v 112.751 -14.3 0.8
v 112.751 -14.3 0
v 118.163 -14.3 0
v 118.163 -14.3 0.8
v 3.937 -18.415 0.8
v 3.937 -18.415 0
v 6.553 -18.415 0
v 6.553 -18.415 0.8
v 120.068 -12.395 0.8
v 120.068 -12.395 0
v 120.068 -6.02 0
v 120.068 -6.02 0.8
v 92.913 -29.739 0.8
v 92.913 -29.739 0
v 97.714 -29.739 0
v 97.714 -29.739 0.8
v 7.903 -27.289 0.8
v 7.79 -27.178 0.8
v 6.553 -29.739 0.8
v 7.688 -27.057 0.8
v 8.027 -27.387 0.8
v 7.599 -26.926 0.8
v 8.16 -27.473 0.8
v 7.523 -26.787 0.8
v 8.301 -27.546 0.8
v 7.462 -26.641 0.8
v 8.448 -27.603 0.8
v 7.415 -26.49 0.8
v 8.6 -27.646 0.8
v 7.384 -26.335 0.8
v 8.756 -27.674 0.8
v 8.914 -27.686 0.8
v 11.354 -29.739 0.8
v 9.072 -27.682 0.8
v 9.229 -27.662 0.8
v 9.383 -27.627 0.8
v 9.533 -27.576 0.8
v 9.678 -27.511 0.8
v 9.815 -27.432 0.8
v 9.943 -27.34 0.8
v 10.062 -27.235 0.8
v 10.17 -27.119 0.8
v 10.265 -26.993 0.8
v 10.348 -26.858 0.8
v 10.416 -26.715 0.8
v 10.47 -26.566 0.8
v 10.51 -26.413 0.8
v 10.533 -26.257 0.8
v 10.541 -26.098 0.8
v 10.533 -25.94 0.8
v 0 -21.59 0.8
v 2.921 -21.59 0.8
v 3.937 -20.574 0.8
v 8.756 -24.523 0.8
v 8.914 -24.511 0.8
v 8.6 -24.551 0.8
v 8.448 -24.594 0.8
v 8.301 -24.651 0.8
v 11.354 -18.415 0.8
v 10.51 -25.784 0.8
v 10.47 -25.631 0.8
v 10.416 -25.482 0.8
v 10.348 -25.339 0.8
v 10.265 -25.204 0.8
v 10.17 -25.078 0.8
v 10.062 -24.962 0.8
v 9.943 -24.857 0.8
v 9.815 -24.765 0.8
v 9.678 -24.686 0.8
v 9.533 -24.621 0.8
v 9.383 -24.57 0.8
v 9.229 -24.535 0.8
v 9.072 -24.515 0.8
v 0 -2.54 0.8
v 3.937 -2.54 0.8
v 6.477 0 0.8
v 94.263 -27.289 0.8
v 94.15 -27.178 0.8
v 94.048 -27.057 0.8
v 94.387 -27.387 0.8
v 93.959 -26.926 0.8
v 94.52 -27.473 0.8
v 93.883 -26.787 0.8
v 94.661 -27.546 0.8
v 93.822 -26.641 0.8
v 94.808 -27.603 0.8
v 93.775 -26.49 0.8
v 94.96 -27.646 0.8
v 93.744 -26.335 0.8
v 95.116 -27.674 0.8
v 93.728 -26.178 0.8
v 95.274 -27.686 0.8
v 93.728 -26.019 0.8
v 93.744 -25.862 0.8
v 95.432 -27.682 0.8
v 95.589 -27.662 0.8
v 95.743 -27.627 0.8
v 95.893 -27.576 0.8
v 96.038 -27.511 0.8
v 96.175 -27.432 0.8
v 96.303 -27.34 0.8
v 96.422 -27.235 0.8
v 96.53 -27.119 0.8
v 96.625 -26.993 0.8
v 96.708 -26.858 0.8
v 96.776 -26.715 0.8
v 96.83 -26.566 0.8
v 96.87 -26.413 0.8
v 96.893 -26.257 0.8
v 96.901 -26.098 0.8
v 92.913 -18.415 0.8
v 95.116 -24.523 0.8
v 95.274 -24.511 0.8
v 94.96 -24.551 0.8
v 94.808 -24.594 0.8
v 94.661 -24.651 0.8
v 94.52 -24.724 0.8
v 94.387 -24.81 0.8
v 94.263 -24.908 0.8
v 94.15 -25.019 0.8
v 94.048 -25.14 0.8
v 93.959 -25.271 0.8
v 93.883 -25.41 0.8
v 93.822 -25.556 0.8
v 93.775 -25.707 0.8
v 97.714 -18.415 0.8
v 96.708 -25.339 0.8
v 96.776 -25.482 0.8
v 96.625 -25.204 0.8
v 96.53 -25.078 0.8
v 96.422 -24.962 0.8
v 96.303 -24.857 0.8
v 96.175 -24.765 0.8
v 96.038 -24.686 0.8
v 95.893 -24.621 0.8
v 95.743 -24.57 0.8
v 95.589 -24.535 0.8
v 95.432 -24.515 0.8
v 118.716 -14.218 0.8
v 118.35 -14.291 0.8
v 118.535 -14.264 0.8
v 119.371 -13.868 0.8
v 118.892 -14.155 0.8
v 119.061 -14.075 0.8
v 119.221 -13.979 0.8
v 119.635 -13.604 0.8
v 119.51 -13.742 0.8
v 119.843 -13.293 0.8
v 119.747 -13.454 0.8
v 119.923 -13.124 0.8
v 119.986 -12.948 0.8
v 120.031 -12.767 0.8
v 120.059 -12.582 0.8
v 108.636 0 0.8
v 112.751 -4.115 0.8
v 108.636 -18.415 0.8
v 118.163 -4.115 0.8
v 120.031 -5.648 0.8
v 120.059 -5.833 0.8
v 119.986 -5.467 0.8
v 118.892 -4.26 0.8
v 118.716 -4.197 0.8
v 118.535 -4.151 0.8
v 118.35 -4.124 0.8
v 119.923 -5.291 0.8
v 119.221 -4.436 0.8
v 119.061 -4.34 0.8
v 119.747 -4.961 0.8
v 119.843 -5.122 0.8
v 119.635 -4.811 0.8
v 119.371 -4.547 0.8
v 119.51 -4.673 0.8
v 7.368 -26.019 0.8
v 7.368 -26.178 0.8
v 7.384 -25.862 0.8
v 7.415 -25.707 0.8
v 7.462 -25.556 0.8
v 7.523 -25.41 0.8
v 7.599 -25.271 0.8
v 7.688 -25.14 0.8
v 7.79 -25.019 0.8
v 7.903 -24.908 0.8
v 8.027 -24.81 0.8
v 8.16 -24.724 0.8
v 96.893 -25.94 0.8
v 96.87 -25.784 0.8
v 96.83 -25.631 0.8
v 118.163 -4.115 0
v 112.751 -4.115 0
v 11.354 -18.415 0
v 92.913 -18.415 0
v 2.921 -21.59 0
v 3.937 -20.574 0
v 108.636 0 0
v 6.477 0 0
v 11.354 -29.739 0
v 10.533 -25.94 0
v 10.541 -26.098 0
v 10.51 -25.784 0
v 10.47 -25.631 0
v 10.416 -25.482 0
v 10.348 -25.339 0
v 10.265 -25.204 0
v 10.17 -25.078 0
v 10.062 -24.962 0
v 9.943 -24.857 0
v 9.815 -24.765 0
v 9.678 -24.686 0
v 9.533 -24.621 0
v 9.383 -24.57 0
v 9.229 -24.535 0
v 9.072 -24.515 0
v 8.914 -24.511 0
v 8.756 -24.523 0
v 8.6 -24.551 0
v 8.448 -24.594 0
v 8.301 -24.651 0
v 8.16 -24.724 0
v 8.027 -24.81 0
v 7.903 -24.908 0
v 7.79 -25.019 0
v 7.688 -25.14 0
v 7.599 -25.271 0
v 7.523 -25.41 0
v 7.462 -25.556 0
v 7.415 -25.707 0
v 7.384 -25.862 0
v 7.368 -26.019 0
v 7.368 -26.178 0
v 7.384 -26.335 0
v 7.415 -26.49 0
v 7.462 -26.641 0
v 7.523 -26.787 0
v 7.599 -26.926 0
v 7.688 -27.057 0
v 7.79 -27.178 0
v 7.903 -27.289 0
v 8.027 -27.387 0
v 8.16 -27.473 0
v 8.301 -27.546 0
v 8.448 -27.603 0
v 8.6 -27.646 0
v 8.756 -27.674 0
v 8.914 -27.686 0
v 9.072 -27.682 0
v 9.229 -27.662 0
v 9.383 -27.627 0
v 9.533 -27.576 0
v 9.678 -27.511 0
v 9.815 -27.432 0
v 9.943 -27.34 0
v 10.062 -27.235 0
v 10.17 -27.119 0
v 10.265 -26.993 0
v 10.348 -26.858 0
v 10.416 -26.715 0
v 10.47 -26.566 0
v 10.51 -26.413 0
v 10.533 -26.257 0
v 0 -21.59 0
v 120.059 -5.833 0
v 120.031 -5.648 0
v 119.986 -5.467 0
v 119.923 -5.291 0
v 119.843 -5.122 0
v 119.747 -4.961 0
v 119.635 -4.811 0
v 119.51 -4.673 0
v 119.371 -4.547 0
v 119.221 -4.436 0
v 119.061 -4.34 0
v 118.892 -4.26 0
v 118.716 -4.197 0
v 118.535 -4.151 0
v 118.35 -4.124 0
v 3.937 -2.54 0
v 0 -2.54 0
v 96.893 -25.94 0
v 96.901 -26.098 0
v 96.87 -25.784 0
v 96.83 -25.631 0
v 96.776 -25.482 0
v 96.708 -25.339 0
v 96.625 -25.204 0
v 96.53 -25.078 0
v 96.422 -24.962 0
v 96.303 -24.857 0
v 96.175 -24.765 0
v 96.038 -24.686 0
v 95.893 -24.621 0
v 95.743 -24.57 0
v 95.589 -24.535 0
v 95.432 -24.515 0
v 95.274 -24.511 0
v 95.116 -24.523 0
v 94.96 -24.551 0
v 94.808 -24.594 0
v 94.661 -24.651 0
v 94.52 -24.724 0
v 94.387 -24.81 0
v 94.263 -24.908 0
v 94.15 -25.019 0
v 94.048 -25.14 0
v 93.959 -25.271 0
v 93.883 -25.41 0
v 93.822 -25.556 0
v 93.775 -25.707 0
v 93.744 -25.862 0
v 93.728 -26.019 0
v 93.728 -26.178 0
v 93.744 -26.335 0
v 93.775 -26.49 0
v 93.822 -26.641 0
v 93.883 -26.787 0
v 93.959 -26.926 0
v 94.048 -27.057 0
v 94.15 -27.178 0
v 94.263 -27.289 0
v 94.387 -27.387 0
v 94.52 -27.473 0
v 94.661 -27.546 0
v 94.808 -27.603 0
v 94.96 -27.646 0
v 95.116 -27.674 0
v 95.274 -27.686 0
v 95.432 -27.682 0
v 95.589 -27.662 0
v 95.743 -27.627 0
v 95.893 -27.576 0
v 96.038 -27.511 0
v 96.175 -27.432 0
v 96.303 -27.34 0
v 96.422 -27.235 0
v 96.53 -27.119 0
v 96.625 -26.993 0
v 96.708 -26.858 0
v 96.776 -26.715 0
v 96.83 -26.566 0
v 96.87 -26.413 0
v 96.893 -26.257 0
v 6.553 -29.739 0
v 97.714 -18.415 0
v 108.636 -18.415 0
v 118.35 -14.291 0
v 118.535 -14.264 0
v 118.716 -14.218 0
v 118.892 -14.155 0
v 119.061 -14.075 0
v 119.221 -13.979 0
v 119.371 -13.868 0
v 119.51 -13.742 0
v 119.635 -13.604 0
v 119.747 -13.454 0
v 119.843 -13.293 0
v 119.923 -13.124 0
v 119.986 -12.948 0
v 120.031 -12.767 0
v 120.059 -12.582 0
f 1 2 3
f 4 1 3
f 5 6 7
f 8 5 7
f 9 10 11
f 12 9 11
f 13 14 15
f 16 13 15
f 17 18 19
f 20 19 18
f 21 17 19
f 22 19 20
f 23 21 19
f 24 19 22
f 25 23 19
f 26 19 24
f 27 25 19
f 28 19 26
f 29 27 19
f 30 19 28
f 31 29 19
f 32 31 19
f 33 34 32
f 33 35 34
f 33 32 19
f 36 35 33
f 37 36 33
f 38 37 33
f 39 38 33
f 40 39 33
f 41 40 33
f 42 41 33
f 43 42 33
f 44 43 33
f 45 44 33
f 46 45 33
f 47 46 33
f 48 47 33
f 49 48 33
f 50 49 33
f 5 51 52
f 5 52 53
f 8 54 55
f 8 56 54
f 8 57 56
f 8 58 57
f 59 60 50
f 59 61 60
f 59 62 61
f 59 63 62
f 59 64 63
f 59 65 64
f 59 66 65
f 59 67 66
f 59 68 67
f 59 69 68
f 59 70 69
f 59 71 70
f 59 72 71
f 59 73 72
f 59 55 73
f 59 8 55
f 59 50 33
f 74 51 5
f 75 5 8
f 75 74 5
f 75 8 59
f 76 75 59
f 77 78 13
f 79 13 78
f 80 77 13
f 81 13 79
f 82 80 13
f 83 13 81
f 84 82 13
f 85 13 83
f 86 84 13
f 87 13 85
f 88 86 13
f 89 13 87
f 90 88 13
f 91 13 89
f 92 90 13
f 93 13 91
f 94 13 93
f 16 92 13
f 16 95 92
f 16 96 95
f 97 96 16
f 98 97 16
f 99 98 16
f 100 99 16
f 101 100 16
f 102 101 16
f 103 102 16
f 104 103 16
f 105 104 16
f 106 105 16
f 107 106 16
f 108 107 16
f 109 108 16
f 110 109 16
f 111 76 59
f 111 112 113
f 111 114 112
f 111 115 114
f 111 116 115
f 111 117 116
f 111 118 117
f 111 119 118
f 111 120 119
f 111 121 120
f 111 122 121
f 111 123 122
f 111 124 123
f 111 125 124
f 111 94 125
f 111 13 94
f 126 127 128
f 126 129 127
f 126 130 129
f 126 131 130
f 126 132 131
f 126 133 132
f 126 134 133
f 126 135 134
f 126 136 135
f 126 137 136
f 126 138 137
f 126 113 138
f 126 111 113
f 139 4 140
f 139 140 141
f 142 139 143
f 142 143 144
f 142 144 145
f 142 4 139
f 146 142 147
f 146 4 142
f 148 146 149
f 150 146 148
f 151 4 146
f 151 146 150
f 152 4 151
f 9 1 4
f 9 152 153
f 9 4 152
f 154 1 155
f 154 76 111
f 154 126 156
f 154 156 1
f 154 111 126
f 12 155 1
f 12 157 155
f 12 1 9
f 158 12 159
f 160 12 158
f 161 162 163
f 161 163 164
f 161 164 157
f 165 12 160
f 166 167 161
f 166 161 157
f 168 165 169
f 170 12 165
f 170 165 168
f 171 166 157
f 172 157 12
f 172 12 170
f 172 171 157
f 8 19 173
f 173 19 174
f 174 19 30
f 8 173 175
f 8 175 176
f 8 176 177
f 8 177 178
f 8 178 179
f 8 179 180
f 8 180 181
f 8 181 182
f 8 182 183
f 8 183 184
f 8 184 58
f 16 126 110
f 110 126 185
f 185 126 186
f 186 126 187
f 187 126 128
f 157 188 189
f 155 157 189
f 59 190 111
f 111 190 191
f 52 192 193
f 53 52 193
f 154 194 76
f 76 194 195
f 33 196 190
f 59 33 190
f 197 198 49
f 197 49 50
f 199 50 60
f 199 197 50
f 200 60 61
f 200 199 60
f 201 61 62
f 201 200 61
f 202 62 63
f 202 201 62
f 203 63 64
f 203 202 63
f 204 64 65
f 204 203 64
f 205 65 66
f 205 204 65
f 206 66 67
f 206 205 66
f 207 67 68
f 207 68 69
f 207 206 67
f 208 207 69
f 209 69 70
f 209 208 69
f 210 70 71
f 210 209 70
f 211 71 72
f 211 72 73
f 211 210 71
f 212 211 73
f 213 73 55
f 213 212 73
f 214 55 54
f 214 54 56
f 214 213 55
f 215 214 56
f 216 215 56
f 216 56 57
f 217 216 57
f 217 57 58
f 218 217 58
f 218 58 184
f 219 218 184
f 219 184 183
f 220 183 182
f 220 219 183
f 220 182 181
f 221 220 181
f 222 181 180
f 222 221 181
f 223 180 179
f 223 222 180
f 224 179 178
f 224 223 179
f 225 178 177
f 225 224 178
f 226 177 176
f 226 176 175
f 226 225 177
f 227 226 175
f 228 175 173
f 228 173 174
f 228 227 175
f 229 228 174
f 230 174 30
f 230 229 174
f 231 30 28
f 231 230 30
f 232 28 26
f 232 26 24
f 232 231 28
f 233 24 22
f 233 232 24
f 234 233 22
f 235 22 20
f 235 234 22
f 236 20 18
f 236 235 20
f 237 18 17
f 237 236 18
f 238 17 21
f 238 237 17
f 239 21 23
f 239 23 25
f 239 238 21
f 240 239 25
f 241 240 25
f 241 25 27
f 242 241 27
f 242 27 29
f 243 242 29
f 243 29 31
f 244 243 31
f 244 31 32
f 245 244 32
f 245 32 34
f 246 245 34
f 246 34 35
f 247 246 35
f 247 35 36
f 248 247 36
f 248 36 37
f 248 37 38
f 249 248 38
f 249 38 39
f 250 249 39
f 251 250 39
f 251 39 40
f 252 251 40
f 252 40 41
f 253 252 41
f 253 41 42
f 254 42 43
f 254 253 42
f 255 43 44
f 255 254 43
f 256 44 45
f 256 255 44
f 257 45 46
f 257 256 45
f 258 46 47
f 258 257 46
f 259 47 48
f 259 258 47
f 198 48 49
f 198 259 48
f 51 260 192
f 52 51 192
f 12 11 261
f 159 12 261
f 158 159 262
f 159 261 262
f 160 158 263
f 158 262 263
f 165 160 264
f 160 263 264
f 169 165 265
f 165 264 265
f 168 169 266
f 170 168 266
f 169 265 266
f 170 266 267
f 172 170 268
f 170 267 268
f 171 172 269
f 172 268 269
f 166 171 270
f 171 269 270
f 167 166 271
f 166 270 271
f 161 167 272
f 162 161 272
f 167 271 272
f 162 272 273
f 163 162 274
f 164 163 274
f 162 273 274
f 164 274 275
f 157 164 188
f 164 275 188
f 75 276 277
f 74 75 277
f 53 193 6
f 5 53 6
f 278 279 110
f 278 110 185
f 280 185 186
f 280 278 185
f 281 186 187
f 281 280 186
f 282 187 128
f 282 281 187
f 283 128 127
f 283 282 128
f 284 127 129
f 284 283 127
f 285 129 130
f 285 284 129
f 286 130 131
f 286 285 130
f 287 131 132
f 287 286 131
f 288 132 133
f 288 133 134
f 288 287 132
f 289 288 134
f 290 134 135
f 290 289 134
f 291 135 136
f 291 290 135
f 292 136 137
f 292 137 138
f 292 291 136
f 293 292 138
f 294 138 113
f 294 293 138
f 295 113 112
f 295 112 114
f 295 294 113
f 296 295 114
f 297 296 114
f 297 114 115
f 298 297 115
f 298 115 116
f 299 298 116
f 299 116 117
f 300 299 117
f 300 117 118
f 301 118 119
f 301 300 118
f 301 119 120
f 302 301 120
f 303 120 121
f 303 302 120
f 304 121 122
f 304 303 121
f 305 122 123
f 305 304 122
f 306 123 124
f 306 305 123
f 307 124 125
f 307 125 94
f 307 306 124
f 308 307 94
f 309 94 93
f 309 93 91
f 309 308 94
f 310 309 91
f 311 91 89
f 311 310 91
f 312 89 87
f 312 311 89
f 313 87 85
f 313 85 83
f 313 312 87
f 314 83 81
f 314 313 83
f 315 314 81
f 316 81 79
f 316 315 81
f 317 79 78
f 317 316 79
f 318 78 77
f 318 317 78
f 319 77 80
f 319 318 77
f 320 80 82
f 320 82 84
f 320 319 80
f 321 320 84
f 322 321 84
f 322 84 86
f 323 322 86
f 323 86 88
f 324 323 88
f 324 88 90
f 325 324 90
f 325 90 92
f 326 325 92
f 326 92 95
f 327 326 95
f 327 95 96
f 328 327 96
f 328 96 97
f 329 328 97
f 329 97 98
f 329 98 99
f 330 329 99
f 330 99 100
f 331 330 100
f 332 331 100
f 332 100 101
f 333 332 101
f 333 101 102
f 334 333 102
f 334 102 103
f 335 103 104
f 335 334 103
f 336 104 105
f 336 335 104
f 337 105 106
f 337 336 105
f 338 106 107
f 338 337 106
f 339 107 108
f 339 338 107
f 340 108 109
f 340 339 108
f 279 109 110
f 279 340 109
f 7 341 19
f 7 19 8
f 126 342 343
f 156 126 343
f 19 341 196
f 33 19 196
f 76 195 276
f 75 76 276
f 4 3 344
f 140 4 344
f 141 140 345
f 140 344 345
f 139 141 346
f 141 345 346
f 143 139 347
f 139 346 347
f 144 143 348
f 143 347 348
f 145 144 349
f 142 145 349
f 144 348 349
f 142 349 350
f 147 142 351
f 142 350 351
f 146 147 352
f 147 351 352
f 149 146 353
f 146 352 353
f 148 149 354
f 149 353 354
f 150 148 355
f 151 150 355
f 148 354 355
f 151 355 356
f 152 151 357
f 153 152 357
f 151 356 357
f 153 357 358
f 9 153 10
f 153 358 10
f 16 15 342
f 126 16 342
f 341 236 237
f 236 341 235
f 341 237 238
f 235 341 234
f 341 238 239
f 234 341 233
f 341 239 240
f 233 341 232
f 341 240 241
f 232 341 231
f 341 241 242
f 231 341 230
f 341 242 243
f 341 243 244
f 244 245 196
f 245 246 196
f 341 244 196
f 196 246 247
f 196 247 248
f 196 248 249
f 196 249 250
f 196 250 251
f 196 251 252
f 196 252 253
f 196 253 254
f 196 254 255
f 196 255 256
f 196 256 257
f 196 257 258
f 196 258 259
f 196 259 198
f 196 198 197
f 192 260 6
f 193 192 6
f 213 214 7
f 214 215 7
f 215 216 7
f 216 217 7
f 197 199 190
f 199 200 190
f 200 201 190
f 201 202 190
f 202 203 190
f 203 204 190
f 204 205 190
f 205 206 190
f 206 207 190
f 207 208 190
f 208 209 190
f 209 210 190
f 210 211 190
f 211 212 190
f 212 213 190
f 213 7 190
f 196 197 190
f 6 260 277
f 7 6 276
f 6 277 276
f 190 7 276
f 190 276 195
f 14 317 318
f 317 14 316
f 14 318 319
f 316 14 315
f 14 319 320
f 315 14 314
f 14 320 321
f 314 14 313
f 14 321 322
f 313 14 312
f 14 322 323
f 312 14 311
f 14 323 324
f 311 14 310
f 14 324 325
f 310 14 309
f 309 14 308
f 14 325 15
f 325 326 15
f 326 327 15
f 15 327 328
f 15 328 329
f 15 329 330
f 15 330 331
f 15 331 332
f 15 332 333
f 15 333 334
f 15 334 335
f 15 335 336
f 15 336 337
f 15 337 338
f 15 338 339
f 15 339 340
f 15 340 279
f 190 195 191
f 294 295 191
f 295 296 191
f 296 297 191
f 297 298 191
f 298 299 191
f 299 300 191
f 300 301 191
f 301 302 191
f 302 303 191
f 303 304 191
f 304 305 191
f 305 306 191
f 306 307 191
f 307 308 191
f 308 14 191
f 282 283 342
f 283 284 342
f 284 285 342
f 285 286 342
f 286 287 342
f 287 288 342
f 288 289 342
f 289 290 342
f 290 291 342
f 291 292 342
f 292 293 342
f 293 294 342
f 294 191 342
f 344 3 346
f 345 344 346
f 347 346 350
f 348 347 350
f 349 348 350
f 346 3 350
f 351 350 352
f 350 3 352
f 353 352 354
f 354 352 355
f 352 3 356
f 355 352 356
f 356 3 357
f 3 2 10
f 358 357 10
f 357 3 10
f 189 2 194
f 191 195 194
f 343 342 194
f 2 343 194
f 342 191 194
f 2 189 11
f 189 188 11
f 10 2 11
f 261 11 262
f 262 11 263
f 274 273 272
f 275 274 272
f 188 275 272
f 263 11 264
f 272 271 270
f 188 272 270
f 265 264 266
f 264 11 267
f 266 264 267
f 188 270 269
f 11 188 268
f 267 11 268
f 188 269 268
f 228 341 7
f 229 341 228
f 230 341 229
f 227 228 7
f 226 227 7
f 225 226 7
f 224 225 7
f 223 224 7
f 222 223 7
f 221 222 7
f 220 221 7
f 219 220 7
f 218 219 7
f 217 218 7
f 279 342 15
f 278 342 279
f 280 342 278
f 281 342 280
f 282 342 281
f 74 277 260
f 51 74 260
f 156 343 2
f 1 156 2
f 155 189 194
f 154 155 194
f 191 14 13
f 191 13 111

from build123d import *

# Parameters (mm, degrees)
F0_W     = 4.801906
F0_H     = 11.323674
F0_R     = 1.5875
F1_DEPTH = 0.8


with BuildPart() as f1:
    # F0 (on Top) → F1 (new body)
    with BuildSketch(Plane.XY):
        with BuildLine():
            ThreePointArc((120.0679, -6.0198), (119.509938, -4.672762), (118.1629, -4.1148))
            Line((118.1629, -4.1148), (112.7506, -4.1148))
            Line((112.7506, -4.1148), (108.6358, 0))
            Line((108.6358, 0), (6.477, 0))
            Line((6.477, 0), (3.937, -2.54))
            Line((3.937, -2.54), (0, -2.54))
            Line((0, -2.54), (0, -18.415))
            Line((0, -18.415), (0, -21.59))
            Line((0, -21.59), (2.921, -21.59))
            Line((2.921, -21.59), (3.937, -20.574))
            Line((3.937, -20.574), (3.937, -18.415))
            Line((3.937, -18.415), (6.552547, -18.415))
            Line((6.552547, -18.415), (11.354453, -18.415))
            Line((11.354453, -18.415), (92.912547, -18.415))
            Line((92.912547, -18.415), (97.714453, -18.415))
            Line((97.714453, -18.415), (108.6358, -18.415))
            Line((108.6358, -18.415), (112.7506, -14.3002))
            Line((112.7506, -14.3002), (118.1629, -14.3002))
            ThreePointArc((118.1629, -14.3002), (119.509938, -13.742238), (120.0679, -12.3952))
            Line((120.0679, -12.3952), (120.0679, -6.0198))
        make_face()
        with Locations((8.9535, -24.076837)):
            Rectangle(F0_W, F0_H)
        with Locations((8.9535, -26.0985)):
            Circle(F0_R, mode=Mode.SUBTRACT)
        with Locations((95.3135, -24.076837)):
            Rectangle(F0_W, F0_H)
        with Locations((95.3135, -26.0985)):
            Circle(F0_R, mode=Mode.SUBTRACT)
    extrude(amount=F1_DEPTH)


solid = f1.part
